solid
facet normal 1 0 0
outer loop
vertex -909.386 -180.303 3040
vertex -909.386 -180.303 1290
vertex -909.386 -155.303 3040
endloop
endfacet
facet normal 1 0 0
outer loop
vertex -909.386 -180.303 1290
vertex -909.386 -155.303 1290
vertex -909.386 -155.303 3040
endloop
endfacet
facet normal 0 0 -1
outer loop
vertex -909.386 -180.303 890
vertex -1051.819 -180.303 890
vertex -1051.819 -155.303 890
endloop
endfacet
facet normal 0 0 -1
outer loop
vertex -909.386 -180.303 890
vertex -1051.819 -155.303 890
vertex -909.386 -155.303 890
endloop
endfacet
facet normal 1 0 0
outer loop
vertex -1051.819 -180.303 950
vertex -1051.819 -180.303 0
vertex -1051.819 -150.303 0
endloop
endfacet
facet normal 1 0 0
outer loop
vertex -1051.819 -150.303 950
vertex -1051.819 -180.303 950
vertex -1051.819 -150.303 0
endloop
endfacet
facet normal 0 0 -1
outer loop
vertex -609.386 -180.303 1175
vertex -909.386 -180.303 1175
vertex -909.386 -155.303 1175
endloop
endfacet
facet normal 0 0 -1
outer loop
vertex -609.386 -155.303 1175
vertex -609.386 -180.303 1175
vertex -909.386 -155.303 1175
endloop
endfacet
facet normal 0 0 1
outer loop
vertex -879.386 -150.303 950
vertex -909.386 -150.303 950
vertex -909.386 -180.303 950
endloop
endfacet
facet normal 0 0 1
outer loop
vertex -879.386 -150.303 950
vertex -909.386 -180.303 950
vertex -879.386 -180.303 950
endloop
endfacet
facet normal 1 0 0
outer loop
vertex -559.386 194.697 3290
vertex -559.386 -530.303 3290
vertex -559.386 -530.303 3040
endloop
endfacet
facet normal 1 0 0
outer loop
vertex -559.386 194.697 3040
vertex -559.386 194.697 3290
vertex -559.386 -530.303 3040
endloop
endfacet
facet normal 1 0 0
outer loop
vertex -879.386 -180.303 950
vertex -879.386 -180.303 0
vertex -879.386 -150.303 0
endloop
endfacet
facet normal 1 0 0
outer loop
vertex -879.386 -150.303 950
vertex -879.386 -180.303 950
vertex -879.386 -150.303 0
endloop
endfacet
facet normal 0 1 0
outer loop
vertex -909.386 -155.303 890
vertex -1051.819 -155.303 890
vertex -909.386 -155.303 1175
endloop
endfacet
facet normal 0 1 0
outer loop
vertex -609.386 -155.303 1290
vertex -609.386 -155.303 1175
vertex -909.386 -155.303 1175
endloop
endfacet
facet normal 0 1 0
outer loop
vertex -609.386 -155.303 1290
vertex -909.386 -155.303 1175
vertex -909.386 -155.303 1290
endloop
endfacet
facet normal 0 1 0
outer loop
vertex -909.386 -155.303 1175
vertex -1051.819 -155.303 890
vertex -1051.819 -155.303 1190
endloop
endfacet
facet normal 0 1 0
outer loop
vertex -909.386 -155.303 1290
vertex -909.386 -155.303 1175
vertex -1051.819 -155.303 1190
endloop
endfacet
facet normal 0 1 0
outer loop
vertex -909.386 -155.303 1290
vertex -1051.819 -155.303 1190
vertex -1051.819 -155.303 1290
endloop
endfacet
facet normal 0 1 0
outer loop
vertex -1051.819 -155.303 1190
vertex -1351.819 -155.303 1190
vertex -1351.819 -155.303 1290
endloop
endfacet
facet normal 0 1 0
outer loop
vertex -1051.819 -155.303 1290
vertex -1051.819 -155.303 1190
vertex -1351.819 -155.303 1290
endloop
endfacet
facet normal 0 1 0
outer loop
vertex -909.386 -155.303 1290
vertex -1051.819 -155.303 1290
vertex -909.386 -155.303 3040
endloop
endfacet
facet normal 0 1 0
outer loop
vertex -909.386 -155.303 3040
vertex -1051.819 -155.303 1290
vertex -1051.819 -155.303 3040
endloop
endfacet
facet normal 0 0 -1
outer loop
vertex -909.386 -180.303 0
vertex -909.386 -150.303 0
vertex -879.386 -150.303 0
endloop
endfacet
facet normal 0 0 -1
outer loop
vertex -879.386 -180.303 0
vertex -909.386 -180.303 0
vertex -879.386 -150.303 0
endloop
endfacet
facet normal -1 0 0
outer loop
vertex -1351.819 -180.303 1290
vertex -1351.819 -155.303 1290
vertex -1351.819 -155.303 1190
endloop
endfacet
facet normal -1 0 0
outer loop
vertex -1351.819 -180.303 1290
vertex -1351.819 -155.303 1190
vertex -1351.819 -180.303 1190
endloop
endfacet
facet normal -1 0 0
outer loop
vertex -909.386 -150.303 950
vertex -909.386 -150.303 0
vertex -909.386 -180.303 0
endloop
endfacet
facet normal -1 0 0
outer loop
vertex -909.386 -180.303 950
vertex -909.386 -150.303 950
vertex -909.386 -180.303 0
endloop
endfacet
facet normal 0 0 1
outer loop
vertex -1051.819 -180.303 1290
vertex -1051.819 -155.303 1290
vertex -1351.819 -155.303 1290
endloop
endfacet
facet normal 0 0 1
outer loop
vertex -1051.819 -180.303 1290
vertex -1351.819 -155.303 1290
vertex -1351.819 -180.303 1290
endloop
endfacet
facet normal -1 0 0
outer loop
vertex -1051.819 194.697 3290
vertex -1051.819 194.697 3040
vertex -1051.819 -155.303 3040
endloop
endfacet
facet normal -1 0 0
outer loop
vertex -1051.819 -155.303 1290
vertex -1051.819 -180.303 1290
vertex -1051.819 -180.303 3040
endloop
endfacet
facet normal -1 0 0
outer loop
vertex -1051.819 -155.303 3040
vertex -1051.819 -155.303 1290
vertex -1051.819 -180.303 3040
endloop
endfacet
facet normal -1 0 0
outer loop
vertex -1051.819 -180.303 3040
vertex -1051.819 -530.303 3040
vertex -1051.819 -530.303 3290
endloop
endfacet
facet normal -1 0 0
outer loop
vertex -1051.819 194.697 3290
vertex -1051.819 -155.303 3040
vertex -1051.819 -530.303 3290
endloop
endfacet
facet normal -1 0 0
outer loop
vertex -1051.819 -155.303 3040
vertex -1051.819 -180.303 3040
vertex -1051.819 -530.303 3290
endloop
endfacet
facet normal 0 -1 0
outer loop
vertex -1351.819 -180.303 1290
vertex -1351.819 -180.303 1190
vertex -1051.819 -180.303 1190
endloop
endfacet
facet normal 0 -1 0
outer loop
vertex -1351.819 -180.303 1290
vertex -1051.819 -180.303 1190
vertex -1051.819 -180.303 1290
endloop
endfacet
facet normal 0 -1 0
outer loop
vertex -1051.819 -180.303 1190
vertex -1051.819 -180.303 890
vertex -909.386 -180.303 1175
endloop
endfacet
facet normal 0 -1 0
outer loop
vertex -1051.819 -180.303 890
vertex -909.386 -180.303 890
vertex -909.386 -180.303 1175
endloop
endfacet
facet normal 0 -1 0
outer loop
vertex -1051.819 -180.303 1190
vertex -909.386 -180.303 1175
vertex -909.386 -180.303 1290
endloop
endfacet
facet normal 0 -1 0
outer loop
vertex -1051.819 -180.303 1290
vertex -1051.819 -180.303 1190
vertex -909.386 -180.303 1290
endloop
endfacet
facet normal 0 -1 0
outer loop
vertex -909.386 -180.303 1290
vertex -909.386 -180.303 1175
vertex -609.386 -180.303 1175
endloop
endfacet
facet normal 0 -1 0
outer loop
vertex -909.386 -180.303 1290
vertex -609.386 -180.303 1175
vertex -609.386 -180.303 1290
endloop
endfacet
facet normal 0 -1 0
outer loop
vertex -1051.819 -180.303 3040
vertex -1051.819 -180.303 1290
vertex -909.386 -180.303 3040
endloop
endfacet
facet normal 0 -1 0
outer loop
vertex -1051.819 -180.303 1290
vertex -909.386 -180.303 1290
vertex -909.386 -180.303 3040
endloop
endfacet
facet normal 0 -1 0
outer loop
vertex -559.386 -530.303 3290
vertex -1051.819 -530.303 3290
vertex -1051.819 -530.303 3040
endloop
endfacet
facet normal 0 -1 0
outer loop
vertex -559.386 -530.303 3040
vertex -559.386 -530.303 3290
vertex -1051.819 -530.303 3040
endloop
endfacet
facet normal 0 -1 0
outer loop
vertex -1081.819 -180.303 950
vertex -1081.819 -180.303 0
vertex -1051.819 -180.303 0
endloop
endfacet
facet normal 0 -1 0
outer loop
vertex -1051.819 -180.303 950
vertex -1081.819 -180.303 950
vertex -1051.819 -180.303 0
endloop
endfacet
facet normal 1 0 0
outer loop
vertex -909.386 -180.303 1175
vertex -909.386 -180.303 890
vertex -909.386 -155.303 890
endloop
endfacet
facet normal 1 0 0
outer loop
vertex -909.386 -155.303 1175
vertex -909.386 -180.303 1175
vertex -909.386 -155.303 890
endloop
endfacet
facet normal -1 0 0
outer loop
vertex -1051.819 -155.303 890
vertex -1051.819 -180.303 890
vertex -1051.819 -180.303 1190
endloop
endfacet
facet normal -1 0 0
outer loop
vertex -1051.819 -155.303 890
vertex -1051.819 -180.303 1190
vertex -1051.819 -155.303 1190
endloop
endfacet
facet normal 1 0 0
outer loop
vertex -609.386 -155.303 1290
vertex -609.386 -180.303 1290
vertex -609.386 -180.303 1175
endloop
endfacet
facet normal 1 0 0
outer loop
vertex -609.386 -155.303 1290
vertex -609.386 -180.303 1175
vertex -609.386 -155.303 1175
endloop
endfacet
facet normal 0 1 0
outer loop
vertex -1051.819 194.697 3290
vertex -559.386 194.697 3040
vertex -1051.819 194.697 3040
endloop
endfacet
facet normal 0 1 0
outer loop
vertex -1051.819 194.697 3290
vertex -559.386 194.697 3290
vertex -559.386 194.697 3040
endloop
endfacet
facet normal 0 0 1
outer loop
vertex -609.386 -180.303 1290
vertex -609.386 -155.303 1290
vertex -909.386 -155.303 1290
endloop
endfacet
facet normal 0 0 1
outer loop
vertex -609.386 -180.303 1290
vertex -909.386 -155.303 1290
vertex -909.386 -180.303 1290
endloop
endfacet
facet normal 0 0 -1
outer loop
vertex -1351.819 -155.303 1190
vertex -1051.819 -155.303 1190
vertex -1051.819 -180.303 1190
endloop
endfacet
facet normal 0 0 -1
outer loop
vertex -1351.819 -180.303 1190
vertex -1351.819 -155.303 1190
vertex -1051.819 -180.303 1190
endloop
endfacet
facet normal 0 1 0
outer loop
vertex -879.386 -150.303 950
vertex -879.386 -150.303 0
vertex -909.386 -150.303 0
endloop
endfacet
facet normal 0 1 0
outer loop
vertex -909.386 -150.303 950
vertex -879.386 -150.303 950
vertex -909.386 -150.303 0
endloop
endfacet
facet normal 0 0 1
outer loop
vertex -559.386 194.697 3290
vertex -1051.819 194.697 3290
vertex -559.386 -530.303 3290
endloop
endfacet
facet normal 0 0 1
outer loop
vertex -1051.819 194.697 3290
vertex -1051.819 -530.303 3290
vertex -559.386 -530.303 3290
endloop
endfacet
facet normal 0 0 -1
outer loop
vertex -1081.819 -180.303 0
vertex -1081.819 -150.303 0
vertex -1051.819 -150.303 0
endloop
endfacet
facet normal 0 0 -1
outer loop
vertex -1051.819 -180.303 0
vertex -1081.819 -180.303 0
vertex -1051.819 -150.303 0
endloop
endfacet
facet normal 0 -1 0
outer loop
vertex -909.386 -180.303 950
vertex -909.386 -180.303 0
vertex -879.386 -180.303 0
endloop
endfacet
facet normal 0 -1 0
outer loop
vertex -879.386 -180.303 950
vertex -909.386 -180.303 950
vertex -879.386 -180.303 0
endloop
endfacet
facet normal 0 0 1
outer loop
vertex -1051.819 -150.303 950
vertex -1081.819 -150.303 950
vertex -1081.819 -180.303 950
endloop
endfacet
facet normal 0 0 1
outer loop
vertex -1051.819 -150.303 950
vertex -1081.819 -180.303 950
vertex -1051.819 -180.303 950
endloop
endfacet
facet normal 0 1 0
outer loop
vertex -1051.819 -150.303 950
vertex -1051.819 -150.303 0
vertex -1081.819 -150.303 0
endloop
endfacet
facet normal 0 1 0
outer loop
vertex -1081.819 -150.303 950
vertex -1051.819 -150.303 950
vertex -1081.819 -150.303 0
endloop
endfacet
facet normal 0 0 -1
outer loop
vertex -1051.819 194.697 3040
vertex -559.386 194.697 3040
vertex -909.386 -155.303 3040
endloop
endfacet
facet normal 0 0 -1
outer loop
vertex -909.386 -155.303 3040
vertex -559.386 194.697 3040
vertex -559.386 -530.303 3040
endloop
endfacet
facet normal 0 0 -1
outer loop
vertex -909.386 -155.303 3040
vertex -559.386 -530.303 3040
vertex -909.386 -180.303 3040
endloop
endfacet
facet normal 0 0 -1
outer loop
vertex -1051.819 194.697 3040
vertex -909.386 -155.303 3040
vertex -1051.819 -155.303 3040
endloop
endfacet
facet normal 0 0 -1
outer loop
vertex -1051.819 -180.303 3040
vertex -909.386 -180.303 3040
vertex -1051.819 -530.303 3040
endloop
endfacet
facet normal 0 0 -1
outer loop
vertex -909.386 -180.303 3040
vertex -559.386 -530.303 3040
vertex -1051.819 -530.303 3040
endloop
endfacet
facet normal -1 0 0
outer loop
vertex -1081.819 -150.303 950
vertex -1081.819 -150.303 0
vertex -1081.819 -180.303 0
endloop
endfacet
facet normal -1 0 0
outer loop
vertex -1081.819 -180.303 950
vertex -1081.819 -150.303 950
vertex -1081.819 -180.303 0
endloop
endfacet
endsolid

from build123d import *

# Parameters (mm, degrees)
F1_DEPTH  = 950
F2_W      = 142.4321246147
F2_H      = 60
F3_DEPTH  = 25
F4_W      = 142.4321246147
F4_H      = 25
F5_DEPTH  = 340
F6_W      = 25
F6_H      = 115
F7_DEPTH  = 300
F8_W      = 25
F8_H      = 100
F9_DEPTH  = 300
F11_DEPTH = 2000
F12_W     = 142.4321246147
F12_H     = 250
F13_DEPTH = 350
F15_DEPTH = 350
F17_DEPTH = 350


with BuildPart() as f1:
    # F0 (on Top) → F1 (new body)
    with BuildSketch(Plane.XY):
        Polygon((-909.3864560127, -150.3031116724), (-909.3864560127, -160.3031116724), (-909.3864560127, -170.3031116724), (-909.3864560127, -180.3031116724), (-879.3864560127, -180.3031116724), (-879.3864560127, -150.3031116724), align=None)
    extrude(amount=F1_DEPTH)


with BuildPart() as f1b:
    # F0 (on Top) → F1, piece 2 (new body)
    with BuildSketch(Plane.XY):
        Polygon((-1051.8185806274, -150.3031116724), (-1081.8185806274, -150.3031116724), (-1081.8185806274, -180.3031116724), (-1051.8185806274, -180.3031116724), (-1051.8185806274, -170.3031116724), (-1051.8185806274, -165.3031116724), (-1051.8185806274, -160.3031116724), align=None)
    extrude(amount=F1_DEPTH)


with BuildPart() as f3:
    # F2 (on face) → F3 (new body)
    with BuildSketch(Plane.XZ.offset(180.3031116724)):
        with Locations((-980.6025183201, 920)):
            Rectangle(F2_W, F2_H)
    extrude(amount=-F3_DEPTH)

    # F4 (on face) → F5 (join)
    with BuildSketch(Plane.XY.offset(950)):
        with Locations((-980.6025183201, -167.8031116724)):
            Rectangle(F4_W, F4_H)
    extrude(amount=F5_DEPTH)

    # F6 (on face) → F7 (join)
    with BuildSketch(Plane.YZ.offset(-909.3864560127)):
        with Locations((-167.8031116724, 1232.5)):
            Rectangle(F6_W, F6_H)
    extrude(amount=F7_DEPTH)

    # F8 (on face) → F9 (join)
    with BuildSketch(Plane(origin=(-1051.8185806274, 0, 0), x_dir=(0, -1, 0), z_dir=(-1, 0, 0))):
        with Locations((167.8031116724, 1240)):
            Rectangle(F8_W, F8_H)
    extrude(amount=F9_DEPTH)

    # F10 (on face) → F11 (join)
    with BuildSketch(Plane.XY.offset(1290)):
        Polygon((-1051.8185806274, -180.3031116724), (-909.3864560127, -180.3031116724), (-1051.8185806274, -155.3031116724), align=None)
        Polygon((-1051.8185806274, -155.3031116724), (-909.3864560127, -180.3031116724), (-909.3864560127, -155.3031116724), align=None)
    extrude(amount=F11_DEPTH)

    # F12 (on face) → F13 (join)
    with BuildSketch(Plane.XZ.offset(180.3031116724)):
        with Locations((-980.6025183201, 3165)):
            Rectangle(F12_W, F12_H)
    extrude(amount=F13_DEPTH)

    # F14 (on face) → F15 (join)
    with BuildSketch(Plane.YZ.offset(-909.3864560127)):
        Polygon((-530.3031116724, 3040), (-180.3031116724, 3040), (-155.3031116724, 3040), (-155.3031116724, 3290), (-530.3031116724, 3290), align=None)
    extrude(amount=F15_DEPTH)

    # F16 (on face) → F17 (join)
    with BuildSketch(Plane(origin=(0, -155.3031116724, 0), x_dir=(-1, 0, 0), z_dir=(0, 1, 0))):
        Polygon((559.3864560127, 3040), (909.3864560127, 3040), (1051.8185806274, 3040), (1051.8185806274, 3290), (559.3864560127, 3290), align=None)
    extrude(amount=F17_DEPTH)


solid = Compound([f1.part, f1b.part, f3.part])
